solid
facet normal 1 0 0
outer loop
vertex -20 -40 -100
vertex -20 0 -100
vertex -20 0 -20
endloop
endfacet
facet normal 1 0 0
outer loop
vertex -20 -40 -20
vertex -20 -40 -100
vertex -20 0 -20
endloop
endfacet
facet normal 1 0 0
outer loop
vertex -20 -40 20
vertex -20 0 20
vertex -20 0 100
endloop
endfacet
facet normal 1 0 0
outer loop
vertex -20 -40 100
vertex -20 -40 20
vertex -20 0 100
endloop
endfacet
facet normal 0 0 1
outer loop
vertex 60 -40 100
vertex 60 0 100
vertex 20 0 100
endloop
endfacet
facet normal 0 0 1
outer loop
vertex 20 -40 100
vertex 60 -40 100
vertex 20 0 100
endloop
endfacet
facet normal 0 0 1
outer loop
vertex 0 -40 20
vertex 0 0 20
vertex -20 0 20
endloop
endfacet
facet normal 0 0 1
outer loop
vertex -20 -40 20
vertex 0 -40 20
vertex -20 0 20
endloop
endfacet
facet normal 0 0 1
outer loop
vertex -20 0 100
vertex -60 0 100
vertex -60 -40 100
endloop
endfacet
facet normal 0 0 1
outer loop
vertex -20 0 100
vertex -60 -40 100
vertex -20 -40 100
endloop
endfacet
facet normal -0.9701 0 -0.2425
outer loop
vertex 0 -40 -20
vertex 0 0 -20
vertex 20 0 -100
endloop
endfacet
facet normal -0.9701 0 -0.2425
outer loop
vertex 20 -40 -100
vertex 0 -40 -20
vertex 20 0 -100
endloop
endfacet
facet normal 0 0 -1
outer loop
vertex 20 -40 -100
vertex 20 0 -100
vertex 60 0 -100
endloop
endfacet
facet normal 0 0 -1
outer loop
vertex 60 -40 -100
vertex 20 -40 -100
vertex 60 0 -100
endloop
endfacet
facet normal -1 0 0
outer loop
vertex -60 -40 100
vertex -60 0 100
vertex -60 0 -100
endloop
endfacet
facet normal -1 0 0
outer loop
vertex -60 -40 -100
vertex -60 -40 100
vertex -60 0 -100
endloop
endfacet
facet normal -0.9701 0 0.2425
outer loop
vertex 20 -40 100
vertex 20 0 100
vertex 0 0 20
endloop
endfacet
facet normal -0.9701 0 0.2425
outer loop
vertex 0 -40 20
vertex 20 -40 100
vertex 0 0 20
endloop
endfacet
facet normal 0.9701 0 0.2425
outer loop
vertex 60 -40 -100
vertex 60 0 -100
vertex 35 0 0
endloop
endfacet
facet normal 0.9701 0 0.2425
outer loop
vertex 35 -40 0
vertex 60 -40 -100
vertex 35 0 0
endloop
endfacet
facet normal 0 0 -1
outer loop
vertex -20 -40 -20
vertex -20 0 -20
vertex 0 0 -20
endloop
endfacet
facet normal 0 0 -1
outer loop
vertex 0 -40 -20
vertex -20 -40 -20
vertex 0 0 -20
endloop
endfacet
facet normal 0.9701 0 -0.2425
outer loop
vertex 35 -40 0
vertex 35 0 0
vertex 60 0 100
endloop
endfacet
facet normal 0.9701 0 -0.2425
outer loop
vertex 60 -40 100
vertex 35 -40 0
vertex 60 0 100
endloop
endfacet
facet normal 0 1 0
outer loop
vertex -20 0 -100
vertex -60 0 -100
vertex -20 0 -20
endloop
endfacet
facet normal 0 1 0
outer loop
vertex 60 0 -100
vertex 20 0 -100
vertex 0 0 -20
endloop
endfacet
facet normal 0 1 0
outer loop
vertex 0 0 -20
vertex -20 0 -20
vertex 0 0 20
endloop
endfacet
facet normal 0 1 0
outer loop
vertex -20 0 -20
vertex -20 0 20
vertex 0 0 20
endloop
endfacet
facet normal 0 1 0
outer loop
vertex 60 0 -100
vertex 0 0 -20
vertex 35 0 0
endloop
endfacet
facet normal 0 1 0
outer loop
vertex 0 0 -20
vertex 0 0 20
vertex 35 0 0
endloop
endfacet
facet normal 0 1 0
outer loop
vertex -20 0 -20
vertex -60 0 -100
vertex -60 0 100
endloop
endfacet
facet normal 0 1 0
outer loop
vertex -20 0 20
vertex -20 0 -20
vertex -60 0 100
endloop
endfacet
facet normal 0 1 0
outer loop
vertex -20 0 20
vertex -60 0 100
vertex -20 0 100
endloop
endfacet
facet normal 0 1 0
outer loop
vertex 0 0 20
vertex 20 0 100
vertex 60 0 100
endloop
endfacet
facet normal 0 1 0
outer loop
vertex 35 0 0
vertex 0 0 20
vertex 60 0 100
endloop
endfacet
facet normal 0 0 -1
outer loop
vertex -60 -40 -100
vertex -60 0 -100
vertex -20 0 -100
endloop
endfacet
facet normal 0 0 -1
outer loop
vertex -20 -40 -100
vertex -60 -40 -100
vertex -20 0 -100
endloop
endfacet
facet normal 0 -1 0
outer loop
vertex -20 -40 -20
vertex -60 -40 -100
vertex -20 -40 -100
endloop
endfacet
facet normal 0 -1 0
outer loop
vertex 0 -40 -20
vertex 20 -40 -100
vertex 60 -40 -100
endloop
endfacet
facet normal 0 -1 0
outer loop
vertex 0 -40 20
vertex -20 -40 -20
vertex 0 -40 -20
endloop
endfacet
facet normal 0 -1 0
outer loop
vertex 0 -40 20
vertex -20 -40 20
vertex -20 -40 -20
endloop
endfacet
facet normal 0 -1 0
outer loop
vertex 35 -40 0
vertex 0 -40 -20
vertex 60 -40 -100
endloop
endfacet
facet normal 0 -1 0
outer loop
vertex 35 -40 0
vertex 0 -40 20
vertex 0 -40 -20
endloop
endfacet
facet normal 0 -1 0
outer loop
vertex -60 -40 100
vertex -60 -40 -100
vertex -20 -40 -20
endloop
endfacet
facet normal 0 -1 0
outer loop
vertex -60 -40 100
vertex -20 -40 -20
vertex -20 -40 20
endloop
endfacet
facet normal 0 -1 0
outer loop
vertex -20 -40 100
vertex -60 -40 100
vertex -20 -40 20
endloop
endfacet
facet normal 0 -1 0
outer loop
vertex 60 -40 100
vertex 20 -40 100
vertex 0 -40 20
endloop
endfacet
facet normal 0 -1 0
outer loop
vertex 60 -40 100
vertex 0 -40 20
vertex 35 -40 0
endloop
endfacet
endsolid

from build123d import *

# Parameters (mm, degrees)
F0_W     = 40
F0_H     = 40
F1_DEPTH = 40


with BuildPart() as f1:
    # F0 (on Front) → F1 (new body)
    with BuildSketch(Plane.XZ):
        with Locations((-40, 80)):
            Rectangle(F0_W, F0_H)
        with Locations((-40, 40)):
            Rectangle(F0_W, F0_H)
        with Locations((-40, 0)):
            Rectangle(F0_W, F0_H)
        with Locations((-40, -40)):
            Rectangle(F0_W, F0_H)
        with Locations((-40, -80)):
            Rectangle(F0_W, F0_H)
        Polygon((20, -20), (20, 20), (0, 20), (-20, 20), (-20, -20), (0, -20), align=None)
        Polygon((35, 0), (40, 20), (20, 20), (20, -20), (40, -20), align=None)
        Polygon((40, -20), (20, -20), (20, -60), (50, -60), align=None)
        Polygon((50, -60), (20, -60), (20, -100), (60, -100), align=None)
        Polygon((20, -60), (20, -20), (0, -20), (10, -60), align=None)
        Polygon((20, -100), (20, -60), (10, -60), align=None)
        Polygon((20, 20), (20, 60), (10, 60), (0, 20), align=None)
        Polygon((40, 20), (50, 60), (20, 60), (20, 20), align=None)
        Polygon((50, 60), (60, 100), (20, 100), (20, 60), align=None)
        Polygon((20, 60), (20, 100), (10, 60), align=None)
    extrude(amount=F1_DEPTH)


solid = f1.part
